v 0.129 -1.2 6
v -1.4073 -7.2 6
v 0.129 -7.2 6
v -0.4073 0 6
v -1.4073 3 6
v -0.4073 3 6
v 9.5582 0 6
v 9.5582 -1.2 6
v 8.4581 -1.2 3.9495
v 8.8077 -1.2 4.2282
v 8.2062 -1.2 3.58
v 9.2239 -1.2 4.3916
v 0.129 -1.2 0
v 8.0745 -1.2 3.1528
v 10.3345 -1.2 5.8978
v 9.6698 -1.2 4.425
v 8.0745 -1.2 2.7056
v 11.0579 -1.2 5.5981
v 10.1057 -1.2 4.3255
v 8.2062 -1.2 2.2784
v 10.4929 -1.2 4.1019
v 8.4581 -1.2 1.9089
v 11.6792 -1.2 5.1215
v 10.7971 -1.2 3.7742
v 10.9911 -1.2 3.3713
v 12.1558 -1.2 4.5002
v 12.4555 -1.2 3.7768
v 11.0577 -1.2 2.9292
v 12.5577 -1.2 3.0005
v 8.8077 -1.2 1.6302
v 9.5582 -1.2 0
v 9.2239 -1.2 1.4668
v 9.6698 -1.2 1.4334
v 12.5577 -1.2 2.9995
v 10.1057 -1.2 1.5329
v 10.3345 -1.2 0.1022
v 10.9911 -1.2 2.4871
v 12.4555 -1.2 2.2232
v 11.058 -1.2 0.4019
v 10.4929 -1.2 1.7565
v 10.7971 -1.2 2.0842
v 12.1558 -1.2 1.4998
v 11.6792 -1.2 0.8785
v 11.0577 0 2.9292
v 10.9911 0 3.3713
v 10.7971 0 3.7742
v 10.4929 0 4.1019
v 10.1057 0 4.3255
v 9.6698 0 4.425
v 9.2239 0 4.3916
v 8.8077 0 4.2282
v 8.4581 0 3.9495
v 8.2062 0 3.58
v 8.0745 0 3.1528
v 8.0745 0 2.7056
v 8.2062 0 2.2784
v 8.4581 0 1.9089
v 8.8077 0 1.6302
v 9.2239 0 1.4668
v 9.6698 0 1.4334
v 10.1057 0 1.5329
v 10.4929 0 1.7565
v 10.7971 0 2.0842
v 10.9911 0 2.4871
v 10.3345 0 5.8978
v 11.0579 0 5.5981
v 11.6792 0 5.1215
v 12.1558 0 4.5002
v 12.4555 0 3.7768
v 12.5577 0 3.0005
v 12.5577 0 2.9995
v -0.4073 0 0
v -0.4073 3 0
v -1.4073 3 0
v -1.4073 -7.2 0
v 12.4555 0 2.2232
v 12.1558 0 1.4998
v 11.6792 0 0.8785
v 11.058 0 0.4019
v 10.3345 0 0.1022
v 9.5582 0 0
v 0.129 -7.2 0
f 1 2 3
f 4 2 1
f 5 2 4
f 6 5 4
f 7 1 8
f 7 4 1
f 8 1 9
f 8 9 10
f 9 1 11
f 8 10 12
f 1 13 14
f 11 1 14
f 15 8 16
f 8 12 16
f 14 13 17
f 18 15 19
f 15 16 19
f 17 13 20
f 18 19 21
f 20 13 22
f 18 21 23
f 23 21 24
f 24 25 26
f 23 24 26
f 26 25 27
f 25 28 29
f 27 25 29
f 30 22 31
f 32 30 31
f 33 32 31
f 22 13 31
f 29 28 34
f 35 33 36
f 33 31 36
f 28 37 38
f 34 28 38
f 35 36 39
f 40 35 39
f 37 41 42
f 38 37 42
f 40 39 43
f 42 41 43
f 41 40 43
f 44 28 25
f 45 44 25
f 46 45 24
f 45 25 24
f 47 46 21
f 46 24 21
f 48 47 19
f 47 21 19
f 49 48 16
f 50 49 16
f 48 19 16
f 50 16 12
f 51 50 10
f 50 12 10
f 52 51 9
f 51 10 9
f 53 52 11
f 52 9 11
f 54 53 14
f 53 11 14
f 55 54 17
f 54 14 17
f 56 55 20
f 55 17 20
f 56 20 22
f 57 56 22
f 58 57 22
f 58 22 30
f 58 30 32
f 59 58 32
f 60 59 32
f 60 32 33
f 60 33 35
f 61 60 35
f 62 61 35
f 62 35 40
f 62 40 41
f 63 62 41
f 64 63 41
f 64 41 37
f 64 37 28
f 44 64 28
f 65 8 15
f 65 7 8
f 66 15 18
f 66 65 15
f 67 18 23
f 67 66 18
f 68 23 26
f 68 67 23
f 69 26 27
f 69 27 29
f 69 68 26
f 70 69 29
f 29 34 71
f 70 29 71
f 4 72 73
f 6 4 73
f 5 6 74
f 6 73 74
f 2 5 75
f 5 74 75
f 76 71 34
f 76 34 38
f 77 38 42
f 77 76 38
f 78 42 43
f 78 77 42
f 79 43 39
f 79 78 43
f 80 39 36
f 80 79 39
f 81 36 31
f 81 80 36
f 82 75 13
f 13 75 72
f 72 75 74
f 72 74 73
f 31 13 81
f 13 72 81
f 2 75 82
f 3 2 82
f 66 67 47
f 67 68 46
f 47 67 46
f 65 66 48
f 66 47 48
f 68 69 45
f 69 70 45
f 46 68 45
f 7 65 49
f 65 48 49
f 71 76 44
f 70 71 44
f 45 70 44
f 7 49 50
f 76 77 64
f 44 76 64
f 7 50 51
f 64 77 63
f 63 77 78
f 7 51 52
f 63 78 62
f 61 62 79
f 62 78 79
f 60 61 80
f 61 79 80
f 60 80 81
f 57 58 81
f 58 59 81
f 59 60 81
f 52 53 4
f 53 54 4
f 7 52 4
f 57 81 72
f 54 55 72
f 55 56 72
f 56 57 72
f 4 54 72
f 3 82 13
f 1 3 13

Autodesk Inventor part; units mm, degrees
ref_plane "YZ Plane" through (0, 0, 0) normal (1, 0, 0) x (0, 1, 0)
ref_plane "XZ Plane" through (0, 0, 0) normal (0, 1, 0) x (-1, 0, 0)
ref_plane "XY Plane" through (0, 0, 0) normal (0, 0, 1) x (1, 0, 0)
sketch "草圖1" plane through (0, 0, 0) normal (0, 0, 1) x (1, 0, 0)
  line L0 (-0.4423, 6) -> (-1.3723, 6) projected
  line L1 (-0.4423, 0) -> (-0.4423, 6) construction
  line L2 (-1.3723, 0) -> (0, 0) construction
  line L3 (-1.3723, 0) -> (-1.3723, 6) construction
  line L4 (-1.4073, -0.0008) -> (-1.4073, -7.2)
  line L5 (-1.4073, -7.2) -> (0.129, -7.2)
  line L6 (0.129, -7.2) -> (0.129, -1.2)
  line L7 (11.0577, 0) -> (8.0577, 0) projected
  line L8 (0.129, -1.2) -> (12.5577, -1.2)
  line L9 (12.5577, -1.2) -> (12.5577, 0)
  line L10 (12.5577, 0) -> (-0.4073, 0)
  line L11 (-0.4073, 0) -> (-0.4073, 3)
  line L12 (-0.4073, 3) -> (-1.4073, 3)
  line L13 (-1.4073, 3) -> (-1.4073, -0.0008)
  point P0 (-0.9073, 3)
  point P1 (9.5577, 0)
  dimension "d0" = 1
  dimension "d1" = 0.465
  dimension "d2" = 0.93
  dimension "d3" = 1.2
  dimension "d5" = 6
  dimension "d6" = 1.5
  dimension "d7" = 3
extrude "擠出1" add sketch "草圖1" along normal blind 6
sketch "草圖2" plane through (0.129, -1.2, 0) normal (0, -1, 0) x (1, 0, 0)
  circle A0 centre (9.4287, 2.9292) radius 1.5 projected
  point P0 (-0.129, 0)
extrude "擠出2" cut sketch "草圖2" against normal blind 4.2
fillet "圓角1" radius 3 2 edges at (12.5577, -0.6, 6) (12.5577, -0.6, 0)
equation "\"d1\" = 0.5 * d2"
properties part number "j1 endstop blocker"
